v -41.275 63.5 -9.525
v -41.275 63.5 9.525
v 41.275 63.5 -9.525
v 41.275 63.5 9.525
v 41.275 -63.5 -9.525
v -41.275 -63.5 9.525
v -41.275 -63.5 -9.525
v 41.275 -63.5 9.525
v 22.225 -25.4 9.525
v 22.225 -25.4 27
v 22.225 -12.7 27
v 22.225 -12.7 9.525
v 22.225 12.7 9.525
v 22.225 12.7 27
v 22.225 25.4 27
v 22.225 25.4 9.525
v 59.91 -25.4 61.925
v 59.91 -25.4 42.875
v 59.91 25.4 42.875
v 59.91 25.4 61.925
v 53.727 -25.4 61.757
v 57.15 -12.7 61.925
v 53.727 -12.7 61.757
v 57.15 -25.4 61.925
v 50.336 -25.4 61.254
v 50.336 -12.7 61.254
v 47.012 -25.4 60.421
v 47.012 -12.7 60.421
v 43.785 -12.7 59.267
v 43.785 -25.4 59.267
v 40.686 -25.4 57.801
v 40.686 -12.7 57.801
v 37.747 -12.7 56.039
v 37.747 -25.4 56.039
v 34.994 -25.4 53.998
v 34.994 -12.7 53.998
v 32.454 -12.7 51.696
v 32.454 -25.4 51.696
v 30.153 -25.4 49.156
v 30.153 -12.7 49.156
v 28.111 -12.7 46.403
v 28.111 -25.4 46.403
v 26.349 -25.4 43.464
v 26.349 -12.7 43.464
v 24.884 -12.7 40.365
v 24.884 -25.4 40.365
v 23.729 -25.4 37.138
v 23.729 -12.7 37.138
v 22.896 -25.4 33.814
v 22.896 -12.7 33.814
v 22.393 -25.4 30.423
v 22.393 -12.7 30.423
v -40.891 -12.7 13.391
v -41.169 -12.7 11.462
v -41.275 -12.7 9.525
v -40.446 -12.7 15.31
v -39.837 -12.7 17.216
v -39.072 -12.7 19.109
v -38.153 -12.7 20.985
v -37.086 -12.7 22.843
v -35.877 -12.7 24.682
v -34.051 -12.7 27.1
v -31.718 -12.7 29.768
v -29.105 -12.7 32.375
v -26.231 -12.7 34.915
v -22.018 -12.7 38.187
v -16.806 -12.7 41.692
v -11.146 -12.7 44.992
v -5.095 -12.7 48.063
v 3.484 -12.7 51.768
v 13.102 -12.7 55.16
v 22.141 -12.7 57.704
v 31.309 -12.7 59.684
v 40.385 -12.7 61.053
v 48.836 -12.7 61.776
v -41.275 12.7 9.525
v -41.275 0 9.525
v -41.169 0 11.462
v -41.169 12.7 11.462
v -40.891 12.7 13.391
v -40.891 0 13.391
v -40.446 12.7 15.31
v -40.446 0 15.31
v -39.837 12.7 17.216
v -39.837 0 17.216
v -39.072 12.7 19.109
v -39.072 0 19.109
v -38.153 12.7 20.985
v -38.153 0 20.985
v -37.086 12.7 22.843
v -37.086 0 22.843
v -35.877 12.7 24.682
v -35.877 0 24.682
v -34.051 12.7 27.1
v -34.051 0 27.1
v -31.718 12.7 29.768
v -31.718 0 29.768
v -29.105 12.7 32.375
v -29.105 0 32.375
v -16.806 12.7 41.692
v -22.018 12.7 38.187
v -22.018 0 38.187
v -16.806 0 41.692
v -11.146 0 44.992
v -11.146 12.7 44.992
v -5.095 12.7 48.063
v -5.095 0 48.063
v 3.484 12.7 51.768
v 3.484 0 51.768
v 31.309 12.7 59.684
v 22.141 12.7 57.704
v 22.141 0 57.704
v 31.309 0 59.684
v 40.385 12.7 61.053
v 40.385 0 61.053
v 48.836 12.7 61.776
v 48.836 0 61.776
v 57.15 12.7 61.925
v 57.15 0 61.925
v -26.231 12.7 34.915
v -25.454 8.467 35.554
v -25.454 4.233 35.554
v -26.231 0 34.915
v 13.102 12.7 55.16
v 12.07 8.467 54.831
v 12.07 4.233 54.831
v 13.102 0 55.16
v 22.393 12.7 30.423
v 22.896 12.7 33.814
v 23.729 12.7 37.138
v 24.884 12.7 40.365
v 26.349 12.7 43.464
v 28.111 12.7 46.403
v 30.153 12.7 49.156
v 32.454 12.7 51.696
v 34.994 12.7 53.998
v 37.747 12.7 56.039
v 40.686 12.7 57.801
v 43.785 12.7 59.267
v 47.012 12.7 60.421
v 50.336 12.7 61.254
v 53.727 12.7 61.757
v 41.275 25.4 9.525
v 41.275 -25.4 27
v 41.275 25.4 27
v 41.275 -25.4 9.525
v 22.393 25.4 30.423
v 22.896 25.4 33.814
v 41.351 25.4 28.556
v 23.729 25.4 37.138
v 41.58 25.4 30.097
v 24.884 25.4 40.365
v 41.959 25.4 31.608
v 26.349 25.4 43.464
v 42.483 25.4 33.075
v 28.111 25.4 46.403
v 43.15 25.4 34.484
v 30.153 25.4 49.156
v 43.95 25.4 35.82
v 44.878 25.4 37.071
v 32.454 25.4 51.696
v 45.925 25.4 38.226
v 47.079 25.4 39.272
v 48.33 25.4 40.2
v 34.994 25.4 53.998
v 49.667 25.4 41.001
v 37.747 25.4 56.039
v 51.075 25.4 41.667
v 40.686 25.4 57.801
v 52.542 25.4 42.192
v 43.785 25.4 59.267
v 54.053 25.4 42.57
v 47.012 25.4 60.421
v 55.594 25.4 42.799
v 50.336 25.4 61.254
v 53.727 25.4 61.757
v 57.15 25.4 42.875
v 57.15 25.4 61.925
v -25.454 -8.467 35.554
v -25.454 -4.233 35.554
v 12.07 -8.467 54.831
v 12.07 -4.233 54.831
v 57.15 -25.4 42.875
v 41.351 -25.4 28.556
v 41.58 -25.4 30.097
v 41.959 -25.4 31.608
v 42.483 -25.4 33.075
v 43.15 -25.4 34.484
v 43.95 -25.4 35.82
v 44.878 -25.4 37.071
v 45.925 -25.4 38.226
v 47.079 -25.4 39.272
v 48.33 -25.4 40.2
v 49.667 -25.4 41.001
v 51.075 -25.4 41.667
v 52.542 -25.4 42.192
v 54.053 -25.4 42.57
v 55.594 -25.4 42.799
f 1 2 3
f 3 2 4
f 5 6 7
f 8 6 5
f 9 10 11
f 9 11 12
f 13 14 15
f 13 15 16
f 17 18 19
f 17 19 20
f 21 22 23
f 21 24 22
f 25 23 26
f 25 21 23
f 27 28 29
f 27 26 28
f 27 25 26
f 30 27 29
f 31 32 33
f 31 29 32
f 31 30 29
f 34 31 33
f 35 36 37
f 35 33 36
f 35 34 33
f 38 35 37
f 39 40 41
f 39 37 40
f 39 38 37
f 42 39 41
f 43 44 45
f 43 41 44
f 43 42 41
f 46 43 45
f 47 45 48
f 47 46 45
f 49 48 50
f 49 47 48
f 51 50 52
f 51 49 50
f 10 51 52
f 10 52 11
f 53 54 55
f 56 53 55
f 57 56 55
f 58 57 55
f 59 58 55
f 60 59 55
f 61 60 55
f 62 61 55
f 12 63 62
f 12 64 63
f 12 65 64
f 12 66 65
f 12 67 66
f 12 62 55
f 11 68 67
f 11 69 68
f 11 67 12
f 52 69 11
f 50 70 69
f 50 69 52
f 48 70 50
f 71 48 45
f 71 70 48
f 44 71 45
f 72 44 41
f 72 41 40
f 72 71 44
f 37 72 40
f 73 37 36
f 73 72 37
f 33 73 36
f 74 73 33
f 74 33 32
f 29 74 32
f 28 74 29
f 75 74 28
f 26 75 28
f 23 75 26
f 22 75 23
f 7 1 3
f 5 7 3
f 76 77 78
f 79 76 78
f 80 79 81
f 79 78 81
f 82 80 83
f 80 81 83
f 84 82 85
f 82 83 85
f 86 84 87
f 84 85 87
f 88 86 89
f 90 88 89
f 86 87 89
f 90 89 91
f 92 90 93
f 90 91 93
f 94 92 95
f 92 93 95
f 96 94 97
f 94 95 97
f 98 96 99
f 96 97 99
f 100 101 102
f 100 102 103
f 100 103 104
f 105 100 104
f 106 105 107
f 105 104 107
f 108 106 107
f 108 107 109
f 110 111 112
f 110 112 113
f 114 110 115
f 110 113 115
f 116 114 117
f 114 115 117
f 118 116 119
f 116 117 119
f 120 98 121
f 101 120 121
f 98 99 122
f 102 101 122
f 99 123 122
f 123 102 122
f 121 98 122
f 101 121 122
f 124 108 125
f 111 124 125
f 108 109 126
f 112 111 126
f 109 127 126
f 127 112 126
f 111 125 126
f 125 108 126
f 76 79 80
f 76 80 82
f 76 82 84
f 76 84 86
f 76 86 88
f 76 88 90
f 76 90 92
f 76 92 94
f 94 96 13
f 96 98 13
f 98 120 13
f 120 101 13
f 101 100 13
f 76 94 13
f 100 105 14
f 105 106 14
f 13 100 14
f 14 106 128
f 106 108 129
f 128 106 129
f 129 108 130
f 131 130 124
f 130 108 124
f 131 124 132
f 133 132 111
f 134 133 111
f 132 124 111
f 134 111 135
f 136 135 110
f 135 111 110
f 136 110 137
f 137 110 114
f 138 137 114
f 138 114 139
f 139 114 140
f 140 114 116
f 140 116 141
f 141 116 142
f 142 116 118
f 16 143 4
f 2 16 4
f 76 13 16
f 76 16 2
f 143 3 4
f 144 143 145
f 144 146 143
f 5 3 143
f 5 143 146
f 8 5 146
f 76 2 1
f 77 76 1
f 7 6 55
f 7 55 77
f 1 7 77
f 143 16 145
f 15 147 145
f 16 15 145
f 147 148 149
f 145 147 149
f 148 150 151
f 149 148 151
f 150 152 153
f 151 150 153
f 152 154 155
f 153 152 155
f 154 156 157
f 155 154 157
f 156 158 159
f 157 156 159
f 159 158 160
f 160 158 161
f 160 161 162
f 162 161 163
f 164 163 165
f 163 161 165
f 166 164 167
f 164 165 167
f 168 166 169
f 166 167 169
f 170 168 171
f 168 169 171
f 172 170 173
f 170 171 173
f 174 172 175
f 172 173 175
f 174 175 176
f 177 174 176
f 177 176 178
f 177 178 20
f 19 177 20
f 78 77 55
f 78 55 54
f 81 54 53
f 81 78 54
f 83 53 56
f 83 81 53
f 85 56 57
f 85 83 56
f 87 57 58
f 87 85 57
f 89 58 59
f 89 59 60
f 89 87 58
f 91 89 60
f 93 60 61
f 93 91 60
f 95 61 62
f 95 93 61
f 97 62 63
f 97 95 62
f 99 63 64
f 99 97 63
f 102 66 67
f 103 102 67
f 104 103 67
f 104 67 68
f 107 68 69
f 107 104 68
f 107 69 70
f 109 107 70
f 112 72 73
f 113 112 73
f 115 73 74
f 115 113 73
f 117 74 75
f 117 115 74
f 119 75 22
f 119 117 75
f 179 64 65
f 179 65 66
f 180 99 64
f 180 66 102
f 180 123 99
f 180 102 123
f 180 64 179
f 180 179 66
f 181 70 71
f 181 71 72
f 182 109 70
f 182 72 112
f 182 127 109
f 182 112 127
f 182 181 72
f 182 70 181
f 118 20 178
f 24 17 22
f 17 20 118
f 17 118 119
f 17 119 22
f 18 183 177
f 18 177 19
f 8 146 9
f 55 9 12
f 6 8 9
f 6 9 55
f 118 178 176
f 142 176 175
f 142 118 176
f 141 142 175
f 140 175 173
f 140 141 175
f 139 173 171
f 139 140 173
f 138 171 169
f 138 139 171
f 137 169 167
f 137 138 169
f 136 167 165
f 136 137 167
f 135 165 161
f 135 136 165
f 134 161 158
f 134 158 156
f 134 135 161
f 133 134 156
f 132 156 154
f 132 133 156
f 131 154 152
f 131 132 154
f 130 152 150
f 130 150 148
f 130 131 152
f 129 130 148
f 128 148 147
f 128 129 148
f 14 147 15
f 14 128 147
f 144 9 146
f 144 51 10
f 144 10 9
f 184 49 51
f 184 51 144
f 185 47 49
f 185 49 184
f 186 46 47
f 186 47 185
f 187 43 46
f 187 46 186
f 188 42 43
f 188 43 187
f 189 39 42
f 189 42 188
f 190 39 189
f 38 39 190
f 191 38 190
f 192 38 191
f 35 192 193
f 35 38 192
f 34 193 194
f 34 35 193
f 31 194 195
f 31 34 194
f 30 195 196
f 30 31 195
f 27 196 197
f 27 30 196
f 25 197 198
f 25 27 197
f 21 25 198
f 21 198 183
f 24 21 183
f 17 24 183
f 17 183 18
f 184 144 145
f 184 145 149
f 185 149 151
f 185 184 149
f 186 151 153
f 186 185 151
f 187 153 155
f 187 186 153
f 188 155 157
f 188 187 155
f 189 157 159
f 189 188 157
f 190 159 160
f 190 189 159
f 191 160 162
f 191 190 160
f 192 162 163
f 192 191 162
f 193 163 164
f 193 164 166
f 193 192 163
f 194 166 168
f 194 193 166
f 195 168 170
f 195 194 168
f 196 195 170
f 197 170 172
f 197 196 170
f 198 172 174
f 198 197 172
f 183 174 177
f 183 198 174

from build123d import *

# Parameters (mm, degrees)
F1_DEPTH = 63.5
F2_DEPTH = 25.4
F3_DEPTH = 12.7


with BuildPart() as f1:
    # F0 (on Front) → F1 (new body, symmetric)
    with BuildSketch(Plane.XZ):
        Polygon((41.275, -9.525), (41.275, 9.525), (22.225, 9.525), (-41.275, 9.525), (-41.275, -9.525), align=None)
    extrude(amount=F1_DEPTH, both=True)

    # F0 (on Front) → F2 (join, symmetric)
    with BuildSketch(Plane.XZ):
        with BuildLine():
            Line((22.225, 9.525), (41.275, 9.525))
            Line((41.275, 9.525), (41.275, 27.0002))
            ThreePointArc((41.275, 27.0002), (45.92468, 38.22552), (57.15, 42.8752))
            Line((57.15, 42.8752), (59.910303, 42.8752))
            Line((59.910303, 42.8752), (59.910303, 61.9252))
            Line((59.910303, 61.9252), (57.15, 61.9252))
            ThreePointArc((57.15, 61.9252), (32.454296, 51.695904), (22.225, 27.0002))
            Line((22.225, 27.0002), (22.225, 9.525))
        make_face()
    extrude(amount=F2_DEPTH, both=True)

    # F0 (on Front) → F3 (join, symmetric)
    with BuildSketch(Plane.XZ):
        with BuildLine():
            Line((-41.275, 9.525), (22.225, 9.525))
            Line((22.225, 9.525), (22.225, 27.0002))
            ThreePointArc((22.225, 27.0002), (32.454296, 51.695904), (57.15, 61.9252))
            add(Edge.make_bspline(
                [(-41.275, 9.525), (-41.021902, 37.119821), (13.006945, 62.733494), (57.15, 61.9252)],
                knots=[0, 0, 0, 0, 111.504536, 111.504536, 111.504536, 111.504536], degree=3))
        make_face()
    extrude(amount=F3_DEPTH, both=True)


solid = f1.part
